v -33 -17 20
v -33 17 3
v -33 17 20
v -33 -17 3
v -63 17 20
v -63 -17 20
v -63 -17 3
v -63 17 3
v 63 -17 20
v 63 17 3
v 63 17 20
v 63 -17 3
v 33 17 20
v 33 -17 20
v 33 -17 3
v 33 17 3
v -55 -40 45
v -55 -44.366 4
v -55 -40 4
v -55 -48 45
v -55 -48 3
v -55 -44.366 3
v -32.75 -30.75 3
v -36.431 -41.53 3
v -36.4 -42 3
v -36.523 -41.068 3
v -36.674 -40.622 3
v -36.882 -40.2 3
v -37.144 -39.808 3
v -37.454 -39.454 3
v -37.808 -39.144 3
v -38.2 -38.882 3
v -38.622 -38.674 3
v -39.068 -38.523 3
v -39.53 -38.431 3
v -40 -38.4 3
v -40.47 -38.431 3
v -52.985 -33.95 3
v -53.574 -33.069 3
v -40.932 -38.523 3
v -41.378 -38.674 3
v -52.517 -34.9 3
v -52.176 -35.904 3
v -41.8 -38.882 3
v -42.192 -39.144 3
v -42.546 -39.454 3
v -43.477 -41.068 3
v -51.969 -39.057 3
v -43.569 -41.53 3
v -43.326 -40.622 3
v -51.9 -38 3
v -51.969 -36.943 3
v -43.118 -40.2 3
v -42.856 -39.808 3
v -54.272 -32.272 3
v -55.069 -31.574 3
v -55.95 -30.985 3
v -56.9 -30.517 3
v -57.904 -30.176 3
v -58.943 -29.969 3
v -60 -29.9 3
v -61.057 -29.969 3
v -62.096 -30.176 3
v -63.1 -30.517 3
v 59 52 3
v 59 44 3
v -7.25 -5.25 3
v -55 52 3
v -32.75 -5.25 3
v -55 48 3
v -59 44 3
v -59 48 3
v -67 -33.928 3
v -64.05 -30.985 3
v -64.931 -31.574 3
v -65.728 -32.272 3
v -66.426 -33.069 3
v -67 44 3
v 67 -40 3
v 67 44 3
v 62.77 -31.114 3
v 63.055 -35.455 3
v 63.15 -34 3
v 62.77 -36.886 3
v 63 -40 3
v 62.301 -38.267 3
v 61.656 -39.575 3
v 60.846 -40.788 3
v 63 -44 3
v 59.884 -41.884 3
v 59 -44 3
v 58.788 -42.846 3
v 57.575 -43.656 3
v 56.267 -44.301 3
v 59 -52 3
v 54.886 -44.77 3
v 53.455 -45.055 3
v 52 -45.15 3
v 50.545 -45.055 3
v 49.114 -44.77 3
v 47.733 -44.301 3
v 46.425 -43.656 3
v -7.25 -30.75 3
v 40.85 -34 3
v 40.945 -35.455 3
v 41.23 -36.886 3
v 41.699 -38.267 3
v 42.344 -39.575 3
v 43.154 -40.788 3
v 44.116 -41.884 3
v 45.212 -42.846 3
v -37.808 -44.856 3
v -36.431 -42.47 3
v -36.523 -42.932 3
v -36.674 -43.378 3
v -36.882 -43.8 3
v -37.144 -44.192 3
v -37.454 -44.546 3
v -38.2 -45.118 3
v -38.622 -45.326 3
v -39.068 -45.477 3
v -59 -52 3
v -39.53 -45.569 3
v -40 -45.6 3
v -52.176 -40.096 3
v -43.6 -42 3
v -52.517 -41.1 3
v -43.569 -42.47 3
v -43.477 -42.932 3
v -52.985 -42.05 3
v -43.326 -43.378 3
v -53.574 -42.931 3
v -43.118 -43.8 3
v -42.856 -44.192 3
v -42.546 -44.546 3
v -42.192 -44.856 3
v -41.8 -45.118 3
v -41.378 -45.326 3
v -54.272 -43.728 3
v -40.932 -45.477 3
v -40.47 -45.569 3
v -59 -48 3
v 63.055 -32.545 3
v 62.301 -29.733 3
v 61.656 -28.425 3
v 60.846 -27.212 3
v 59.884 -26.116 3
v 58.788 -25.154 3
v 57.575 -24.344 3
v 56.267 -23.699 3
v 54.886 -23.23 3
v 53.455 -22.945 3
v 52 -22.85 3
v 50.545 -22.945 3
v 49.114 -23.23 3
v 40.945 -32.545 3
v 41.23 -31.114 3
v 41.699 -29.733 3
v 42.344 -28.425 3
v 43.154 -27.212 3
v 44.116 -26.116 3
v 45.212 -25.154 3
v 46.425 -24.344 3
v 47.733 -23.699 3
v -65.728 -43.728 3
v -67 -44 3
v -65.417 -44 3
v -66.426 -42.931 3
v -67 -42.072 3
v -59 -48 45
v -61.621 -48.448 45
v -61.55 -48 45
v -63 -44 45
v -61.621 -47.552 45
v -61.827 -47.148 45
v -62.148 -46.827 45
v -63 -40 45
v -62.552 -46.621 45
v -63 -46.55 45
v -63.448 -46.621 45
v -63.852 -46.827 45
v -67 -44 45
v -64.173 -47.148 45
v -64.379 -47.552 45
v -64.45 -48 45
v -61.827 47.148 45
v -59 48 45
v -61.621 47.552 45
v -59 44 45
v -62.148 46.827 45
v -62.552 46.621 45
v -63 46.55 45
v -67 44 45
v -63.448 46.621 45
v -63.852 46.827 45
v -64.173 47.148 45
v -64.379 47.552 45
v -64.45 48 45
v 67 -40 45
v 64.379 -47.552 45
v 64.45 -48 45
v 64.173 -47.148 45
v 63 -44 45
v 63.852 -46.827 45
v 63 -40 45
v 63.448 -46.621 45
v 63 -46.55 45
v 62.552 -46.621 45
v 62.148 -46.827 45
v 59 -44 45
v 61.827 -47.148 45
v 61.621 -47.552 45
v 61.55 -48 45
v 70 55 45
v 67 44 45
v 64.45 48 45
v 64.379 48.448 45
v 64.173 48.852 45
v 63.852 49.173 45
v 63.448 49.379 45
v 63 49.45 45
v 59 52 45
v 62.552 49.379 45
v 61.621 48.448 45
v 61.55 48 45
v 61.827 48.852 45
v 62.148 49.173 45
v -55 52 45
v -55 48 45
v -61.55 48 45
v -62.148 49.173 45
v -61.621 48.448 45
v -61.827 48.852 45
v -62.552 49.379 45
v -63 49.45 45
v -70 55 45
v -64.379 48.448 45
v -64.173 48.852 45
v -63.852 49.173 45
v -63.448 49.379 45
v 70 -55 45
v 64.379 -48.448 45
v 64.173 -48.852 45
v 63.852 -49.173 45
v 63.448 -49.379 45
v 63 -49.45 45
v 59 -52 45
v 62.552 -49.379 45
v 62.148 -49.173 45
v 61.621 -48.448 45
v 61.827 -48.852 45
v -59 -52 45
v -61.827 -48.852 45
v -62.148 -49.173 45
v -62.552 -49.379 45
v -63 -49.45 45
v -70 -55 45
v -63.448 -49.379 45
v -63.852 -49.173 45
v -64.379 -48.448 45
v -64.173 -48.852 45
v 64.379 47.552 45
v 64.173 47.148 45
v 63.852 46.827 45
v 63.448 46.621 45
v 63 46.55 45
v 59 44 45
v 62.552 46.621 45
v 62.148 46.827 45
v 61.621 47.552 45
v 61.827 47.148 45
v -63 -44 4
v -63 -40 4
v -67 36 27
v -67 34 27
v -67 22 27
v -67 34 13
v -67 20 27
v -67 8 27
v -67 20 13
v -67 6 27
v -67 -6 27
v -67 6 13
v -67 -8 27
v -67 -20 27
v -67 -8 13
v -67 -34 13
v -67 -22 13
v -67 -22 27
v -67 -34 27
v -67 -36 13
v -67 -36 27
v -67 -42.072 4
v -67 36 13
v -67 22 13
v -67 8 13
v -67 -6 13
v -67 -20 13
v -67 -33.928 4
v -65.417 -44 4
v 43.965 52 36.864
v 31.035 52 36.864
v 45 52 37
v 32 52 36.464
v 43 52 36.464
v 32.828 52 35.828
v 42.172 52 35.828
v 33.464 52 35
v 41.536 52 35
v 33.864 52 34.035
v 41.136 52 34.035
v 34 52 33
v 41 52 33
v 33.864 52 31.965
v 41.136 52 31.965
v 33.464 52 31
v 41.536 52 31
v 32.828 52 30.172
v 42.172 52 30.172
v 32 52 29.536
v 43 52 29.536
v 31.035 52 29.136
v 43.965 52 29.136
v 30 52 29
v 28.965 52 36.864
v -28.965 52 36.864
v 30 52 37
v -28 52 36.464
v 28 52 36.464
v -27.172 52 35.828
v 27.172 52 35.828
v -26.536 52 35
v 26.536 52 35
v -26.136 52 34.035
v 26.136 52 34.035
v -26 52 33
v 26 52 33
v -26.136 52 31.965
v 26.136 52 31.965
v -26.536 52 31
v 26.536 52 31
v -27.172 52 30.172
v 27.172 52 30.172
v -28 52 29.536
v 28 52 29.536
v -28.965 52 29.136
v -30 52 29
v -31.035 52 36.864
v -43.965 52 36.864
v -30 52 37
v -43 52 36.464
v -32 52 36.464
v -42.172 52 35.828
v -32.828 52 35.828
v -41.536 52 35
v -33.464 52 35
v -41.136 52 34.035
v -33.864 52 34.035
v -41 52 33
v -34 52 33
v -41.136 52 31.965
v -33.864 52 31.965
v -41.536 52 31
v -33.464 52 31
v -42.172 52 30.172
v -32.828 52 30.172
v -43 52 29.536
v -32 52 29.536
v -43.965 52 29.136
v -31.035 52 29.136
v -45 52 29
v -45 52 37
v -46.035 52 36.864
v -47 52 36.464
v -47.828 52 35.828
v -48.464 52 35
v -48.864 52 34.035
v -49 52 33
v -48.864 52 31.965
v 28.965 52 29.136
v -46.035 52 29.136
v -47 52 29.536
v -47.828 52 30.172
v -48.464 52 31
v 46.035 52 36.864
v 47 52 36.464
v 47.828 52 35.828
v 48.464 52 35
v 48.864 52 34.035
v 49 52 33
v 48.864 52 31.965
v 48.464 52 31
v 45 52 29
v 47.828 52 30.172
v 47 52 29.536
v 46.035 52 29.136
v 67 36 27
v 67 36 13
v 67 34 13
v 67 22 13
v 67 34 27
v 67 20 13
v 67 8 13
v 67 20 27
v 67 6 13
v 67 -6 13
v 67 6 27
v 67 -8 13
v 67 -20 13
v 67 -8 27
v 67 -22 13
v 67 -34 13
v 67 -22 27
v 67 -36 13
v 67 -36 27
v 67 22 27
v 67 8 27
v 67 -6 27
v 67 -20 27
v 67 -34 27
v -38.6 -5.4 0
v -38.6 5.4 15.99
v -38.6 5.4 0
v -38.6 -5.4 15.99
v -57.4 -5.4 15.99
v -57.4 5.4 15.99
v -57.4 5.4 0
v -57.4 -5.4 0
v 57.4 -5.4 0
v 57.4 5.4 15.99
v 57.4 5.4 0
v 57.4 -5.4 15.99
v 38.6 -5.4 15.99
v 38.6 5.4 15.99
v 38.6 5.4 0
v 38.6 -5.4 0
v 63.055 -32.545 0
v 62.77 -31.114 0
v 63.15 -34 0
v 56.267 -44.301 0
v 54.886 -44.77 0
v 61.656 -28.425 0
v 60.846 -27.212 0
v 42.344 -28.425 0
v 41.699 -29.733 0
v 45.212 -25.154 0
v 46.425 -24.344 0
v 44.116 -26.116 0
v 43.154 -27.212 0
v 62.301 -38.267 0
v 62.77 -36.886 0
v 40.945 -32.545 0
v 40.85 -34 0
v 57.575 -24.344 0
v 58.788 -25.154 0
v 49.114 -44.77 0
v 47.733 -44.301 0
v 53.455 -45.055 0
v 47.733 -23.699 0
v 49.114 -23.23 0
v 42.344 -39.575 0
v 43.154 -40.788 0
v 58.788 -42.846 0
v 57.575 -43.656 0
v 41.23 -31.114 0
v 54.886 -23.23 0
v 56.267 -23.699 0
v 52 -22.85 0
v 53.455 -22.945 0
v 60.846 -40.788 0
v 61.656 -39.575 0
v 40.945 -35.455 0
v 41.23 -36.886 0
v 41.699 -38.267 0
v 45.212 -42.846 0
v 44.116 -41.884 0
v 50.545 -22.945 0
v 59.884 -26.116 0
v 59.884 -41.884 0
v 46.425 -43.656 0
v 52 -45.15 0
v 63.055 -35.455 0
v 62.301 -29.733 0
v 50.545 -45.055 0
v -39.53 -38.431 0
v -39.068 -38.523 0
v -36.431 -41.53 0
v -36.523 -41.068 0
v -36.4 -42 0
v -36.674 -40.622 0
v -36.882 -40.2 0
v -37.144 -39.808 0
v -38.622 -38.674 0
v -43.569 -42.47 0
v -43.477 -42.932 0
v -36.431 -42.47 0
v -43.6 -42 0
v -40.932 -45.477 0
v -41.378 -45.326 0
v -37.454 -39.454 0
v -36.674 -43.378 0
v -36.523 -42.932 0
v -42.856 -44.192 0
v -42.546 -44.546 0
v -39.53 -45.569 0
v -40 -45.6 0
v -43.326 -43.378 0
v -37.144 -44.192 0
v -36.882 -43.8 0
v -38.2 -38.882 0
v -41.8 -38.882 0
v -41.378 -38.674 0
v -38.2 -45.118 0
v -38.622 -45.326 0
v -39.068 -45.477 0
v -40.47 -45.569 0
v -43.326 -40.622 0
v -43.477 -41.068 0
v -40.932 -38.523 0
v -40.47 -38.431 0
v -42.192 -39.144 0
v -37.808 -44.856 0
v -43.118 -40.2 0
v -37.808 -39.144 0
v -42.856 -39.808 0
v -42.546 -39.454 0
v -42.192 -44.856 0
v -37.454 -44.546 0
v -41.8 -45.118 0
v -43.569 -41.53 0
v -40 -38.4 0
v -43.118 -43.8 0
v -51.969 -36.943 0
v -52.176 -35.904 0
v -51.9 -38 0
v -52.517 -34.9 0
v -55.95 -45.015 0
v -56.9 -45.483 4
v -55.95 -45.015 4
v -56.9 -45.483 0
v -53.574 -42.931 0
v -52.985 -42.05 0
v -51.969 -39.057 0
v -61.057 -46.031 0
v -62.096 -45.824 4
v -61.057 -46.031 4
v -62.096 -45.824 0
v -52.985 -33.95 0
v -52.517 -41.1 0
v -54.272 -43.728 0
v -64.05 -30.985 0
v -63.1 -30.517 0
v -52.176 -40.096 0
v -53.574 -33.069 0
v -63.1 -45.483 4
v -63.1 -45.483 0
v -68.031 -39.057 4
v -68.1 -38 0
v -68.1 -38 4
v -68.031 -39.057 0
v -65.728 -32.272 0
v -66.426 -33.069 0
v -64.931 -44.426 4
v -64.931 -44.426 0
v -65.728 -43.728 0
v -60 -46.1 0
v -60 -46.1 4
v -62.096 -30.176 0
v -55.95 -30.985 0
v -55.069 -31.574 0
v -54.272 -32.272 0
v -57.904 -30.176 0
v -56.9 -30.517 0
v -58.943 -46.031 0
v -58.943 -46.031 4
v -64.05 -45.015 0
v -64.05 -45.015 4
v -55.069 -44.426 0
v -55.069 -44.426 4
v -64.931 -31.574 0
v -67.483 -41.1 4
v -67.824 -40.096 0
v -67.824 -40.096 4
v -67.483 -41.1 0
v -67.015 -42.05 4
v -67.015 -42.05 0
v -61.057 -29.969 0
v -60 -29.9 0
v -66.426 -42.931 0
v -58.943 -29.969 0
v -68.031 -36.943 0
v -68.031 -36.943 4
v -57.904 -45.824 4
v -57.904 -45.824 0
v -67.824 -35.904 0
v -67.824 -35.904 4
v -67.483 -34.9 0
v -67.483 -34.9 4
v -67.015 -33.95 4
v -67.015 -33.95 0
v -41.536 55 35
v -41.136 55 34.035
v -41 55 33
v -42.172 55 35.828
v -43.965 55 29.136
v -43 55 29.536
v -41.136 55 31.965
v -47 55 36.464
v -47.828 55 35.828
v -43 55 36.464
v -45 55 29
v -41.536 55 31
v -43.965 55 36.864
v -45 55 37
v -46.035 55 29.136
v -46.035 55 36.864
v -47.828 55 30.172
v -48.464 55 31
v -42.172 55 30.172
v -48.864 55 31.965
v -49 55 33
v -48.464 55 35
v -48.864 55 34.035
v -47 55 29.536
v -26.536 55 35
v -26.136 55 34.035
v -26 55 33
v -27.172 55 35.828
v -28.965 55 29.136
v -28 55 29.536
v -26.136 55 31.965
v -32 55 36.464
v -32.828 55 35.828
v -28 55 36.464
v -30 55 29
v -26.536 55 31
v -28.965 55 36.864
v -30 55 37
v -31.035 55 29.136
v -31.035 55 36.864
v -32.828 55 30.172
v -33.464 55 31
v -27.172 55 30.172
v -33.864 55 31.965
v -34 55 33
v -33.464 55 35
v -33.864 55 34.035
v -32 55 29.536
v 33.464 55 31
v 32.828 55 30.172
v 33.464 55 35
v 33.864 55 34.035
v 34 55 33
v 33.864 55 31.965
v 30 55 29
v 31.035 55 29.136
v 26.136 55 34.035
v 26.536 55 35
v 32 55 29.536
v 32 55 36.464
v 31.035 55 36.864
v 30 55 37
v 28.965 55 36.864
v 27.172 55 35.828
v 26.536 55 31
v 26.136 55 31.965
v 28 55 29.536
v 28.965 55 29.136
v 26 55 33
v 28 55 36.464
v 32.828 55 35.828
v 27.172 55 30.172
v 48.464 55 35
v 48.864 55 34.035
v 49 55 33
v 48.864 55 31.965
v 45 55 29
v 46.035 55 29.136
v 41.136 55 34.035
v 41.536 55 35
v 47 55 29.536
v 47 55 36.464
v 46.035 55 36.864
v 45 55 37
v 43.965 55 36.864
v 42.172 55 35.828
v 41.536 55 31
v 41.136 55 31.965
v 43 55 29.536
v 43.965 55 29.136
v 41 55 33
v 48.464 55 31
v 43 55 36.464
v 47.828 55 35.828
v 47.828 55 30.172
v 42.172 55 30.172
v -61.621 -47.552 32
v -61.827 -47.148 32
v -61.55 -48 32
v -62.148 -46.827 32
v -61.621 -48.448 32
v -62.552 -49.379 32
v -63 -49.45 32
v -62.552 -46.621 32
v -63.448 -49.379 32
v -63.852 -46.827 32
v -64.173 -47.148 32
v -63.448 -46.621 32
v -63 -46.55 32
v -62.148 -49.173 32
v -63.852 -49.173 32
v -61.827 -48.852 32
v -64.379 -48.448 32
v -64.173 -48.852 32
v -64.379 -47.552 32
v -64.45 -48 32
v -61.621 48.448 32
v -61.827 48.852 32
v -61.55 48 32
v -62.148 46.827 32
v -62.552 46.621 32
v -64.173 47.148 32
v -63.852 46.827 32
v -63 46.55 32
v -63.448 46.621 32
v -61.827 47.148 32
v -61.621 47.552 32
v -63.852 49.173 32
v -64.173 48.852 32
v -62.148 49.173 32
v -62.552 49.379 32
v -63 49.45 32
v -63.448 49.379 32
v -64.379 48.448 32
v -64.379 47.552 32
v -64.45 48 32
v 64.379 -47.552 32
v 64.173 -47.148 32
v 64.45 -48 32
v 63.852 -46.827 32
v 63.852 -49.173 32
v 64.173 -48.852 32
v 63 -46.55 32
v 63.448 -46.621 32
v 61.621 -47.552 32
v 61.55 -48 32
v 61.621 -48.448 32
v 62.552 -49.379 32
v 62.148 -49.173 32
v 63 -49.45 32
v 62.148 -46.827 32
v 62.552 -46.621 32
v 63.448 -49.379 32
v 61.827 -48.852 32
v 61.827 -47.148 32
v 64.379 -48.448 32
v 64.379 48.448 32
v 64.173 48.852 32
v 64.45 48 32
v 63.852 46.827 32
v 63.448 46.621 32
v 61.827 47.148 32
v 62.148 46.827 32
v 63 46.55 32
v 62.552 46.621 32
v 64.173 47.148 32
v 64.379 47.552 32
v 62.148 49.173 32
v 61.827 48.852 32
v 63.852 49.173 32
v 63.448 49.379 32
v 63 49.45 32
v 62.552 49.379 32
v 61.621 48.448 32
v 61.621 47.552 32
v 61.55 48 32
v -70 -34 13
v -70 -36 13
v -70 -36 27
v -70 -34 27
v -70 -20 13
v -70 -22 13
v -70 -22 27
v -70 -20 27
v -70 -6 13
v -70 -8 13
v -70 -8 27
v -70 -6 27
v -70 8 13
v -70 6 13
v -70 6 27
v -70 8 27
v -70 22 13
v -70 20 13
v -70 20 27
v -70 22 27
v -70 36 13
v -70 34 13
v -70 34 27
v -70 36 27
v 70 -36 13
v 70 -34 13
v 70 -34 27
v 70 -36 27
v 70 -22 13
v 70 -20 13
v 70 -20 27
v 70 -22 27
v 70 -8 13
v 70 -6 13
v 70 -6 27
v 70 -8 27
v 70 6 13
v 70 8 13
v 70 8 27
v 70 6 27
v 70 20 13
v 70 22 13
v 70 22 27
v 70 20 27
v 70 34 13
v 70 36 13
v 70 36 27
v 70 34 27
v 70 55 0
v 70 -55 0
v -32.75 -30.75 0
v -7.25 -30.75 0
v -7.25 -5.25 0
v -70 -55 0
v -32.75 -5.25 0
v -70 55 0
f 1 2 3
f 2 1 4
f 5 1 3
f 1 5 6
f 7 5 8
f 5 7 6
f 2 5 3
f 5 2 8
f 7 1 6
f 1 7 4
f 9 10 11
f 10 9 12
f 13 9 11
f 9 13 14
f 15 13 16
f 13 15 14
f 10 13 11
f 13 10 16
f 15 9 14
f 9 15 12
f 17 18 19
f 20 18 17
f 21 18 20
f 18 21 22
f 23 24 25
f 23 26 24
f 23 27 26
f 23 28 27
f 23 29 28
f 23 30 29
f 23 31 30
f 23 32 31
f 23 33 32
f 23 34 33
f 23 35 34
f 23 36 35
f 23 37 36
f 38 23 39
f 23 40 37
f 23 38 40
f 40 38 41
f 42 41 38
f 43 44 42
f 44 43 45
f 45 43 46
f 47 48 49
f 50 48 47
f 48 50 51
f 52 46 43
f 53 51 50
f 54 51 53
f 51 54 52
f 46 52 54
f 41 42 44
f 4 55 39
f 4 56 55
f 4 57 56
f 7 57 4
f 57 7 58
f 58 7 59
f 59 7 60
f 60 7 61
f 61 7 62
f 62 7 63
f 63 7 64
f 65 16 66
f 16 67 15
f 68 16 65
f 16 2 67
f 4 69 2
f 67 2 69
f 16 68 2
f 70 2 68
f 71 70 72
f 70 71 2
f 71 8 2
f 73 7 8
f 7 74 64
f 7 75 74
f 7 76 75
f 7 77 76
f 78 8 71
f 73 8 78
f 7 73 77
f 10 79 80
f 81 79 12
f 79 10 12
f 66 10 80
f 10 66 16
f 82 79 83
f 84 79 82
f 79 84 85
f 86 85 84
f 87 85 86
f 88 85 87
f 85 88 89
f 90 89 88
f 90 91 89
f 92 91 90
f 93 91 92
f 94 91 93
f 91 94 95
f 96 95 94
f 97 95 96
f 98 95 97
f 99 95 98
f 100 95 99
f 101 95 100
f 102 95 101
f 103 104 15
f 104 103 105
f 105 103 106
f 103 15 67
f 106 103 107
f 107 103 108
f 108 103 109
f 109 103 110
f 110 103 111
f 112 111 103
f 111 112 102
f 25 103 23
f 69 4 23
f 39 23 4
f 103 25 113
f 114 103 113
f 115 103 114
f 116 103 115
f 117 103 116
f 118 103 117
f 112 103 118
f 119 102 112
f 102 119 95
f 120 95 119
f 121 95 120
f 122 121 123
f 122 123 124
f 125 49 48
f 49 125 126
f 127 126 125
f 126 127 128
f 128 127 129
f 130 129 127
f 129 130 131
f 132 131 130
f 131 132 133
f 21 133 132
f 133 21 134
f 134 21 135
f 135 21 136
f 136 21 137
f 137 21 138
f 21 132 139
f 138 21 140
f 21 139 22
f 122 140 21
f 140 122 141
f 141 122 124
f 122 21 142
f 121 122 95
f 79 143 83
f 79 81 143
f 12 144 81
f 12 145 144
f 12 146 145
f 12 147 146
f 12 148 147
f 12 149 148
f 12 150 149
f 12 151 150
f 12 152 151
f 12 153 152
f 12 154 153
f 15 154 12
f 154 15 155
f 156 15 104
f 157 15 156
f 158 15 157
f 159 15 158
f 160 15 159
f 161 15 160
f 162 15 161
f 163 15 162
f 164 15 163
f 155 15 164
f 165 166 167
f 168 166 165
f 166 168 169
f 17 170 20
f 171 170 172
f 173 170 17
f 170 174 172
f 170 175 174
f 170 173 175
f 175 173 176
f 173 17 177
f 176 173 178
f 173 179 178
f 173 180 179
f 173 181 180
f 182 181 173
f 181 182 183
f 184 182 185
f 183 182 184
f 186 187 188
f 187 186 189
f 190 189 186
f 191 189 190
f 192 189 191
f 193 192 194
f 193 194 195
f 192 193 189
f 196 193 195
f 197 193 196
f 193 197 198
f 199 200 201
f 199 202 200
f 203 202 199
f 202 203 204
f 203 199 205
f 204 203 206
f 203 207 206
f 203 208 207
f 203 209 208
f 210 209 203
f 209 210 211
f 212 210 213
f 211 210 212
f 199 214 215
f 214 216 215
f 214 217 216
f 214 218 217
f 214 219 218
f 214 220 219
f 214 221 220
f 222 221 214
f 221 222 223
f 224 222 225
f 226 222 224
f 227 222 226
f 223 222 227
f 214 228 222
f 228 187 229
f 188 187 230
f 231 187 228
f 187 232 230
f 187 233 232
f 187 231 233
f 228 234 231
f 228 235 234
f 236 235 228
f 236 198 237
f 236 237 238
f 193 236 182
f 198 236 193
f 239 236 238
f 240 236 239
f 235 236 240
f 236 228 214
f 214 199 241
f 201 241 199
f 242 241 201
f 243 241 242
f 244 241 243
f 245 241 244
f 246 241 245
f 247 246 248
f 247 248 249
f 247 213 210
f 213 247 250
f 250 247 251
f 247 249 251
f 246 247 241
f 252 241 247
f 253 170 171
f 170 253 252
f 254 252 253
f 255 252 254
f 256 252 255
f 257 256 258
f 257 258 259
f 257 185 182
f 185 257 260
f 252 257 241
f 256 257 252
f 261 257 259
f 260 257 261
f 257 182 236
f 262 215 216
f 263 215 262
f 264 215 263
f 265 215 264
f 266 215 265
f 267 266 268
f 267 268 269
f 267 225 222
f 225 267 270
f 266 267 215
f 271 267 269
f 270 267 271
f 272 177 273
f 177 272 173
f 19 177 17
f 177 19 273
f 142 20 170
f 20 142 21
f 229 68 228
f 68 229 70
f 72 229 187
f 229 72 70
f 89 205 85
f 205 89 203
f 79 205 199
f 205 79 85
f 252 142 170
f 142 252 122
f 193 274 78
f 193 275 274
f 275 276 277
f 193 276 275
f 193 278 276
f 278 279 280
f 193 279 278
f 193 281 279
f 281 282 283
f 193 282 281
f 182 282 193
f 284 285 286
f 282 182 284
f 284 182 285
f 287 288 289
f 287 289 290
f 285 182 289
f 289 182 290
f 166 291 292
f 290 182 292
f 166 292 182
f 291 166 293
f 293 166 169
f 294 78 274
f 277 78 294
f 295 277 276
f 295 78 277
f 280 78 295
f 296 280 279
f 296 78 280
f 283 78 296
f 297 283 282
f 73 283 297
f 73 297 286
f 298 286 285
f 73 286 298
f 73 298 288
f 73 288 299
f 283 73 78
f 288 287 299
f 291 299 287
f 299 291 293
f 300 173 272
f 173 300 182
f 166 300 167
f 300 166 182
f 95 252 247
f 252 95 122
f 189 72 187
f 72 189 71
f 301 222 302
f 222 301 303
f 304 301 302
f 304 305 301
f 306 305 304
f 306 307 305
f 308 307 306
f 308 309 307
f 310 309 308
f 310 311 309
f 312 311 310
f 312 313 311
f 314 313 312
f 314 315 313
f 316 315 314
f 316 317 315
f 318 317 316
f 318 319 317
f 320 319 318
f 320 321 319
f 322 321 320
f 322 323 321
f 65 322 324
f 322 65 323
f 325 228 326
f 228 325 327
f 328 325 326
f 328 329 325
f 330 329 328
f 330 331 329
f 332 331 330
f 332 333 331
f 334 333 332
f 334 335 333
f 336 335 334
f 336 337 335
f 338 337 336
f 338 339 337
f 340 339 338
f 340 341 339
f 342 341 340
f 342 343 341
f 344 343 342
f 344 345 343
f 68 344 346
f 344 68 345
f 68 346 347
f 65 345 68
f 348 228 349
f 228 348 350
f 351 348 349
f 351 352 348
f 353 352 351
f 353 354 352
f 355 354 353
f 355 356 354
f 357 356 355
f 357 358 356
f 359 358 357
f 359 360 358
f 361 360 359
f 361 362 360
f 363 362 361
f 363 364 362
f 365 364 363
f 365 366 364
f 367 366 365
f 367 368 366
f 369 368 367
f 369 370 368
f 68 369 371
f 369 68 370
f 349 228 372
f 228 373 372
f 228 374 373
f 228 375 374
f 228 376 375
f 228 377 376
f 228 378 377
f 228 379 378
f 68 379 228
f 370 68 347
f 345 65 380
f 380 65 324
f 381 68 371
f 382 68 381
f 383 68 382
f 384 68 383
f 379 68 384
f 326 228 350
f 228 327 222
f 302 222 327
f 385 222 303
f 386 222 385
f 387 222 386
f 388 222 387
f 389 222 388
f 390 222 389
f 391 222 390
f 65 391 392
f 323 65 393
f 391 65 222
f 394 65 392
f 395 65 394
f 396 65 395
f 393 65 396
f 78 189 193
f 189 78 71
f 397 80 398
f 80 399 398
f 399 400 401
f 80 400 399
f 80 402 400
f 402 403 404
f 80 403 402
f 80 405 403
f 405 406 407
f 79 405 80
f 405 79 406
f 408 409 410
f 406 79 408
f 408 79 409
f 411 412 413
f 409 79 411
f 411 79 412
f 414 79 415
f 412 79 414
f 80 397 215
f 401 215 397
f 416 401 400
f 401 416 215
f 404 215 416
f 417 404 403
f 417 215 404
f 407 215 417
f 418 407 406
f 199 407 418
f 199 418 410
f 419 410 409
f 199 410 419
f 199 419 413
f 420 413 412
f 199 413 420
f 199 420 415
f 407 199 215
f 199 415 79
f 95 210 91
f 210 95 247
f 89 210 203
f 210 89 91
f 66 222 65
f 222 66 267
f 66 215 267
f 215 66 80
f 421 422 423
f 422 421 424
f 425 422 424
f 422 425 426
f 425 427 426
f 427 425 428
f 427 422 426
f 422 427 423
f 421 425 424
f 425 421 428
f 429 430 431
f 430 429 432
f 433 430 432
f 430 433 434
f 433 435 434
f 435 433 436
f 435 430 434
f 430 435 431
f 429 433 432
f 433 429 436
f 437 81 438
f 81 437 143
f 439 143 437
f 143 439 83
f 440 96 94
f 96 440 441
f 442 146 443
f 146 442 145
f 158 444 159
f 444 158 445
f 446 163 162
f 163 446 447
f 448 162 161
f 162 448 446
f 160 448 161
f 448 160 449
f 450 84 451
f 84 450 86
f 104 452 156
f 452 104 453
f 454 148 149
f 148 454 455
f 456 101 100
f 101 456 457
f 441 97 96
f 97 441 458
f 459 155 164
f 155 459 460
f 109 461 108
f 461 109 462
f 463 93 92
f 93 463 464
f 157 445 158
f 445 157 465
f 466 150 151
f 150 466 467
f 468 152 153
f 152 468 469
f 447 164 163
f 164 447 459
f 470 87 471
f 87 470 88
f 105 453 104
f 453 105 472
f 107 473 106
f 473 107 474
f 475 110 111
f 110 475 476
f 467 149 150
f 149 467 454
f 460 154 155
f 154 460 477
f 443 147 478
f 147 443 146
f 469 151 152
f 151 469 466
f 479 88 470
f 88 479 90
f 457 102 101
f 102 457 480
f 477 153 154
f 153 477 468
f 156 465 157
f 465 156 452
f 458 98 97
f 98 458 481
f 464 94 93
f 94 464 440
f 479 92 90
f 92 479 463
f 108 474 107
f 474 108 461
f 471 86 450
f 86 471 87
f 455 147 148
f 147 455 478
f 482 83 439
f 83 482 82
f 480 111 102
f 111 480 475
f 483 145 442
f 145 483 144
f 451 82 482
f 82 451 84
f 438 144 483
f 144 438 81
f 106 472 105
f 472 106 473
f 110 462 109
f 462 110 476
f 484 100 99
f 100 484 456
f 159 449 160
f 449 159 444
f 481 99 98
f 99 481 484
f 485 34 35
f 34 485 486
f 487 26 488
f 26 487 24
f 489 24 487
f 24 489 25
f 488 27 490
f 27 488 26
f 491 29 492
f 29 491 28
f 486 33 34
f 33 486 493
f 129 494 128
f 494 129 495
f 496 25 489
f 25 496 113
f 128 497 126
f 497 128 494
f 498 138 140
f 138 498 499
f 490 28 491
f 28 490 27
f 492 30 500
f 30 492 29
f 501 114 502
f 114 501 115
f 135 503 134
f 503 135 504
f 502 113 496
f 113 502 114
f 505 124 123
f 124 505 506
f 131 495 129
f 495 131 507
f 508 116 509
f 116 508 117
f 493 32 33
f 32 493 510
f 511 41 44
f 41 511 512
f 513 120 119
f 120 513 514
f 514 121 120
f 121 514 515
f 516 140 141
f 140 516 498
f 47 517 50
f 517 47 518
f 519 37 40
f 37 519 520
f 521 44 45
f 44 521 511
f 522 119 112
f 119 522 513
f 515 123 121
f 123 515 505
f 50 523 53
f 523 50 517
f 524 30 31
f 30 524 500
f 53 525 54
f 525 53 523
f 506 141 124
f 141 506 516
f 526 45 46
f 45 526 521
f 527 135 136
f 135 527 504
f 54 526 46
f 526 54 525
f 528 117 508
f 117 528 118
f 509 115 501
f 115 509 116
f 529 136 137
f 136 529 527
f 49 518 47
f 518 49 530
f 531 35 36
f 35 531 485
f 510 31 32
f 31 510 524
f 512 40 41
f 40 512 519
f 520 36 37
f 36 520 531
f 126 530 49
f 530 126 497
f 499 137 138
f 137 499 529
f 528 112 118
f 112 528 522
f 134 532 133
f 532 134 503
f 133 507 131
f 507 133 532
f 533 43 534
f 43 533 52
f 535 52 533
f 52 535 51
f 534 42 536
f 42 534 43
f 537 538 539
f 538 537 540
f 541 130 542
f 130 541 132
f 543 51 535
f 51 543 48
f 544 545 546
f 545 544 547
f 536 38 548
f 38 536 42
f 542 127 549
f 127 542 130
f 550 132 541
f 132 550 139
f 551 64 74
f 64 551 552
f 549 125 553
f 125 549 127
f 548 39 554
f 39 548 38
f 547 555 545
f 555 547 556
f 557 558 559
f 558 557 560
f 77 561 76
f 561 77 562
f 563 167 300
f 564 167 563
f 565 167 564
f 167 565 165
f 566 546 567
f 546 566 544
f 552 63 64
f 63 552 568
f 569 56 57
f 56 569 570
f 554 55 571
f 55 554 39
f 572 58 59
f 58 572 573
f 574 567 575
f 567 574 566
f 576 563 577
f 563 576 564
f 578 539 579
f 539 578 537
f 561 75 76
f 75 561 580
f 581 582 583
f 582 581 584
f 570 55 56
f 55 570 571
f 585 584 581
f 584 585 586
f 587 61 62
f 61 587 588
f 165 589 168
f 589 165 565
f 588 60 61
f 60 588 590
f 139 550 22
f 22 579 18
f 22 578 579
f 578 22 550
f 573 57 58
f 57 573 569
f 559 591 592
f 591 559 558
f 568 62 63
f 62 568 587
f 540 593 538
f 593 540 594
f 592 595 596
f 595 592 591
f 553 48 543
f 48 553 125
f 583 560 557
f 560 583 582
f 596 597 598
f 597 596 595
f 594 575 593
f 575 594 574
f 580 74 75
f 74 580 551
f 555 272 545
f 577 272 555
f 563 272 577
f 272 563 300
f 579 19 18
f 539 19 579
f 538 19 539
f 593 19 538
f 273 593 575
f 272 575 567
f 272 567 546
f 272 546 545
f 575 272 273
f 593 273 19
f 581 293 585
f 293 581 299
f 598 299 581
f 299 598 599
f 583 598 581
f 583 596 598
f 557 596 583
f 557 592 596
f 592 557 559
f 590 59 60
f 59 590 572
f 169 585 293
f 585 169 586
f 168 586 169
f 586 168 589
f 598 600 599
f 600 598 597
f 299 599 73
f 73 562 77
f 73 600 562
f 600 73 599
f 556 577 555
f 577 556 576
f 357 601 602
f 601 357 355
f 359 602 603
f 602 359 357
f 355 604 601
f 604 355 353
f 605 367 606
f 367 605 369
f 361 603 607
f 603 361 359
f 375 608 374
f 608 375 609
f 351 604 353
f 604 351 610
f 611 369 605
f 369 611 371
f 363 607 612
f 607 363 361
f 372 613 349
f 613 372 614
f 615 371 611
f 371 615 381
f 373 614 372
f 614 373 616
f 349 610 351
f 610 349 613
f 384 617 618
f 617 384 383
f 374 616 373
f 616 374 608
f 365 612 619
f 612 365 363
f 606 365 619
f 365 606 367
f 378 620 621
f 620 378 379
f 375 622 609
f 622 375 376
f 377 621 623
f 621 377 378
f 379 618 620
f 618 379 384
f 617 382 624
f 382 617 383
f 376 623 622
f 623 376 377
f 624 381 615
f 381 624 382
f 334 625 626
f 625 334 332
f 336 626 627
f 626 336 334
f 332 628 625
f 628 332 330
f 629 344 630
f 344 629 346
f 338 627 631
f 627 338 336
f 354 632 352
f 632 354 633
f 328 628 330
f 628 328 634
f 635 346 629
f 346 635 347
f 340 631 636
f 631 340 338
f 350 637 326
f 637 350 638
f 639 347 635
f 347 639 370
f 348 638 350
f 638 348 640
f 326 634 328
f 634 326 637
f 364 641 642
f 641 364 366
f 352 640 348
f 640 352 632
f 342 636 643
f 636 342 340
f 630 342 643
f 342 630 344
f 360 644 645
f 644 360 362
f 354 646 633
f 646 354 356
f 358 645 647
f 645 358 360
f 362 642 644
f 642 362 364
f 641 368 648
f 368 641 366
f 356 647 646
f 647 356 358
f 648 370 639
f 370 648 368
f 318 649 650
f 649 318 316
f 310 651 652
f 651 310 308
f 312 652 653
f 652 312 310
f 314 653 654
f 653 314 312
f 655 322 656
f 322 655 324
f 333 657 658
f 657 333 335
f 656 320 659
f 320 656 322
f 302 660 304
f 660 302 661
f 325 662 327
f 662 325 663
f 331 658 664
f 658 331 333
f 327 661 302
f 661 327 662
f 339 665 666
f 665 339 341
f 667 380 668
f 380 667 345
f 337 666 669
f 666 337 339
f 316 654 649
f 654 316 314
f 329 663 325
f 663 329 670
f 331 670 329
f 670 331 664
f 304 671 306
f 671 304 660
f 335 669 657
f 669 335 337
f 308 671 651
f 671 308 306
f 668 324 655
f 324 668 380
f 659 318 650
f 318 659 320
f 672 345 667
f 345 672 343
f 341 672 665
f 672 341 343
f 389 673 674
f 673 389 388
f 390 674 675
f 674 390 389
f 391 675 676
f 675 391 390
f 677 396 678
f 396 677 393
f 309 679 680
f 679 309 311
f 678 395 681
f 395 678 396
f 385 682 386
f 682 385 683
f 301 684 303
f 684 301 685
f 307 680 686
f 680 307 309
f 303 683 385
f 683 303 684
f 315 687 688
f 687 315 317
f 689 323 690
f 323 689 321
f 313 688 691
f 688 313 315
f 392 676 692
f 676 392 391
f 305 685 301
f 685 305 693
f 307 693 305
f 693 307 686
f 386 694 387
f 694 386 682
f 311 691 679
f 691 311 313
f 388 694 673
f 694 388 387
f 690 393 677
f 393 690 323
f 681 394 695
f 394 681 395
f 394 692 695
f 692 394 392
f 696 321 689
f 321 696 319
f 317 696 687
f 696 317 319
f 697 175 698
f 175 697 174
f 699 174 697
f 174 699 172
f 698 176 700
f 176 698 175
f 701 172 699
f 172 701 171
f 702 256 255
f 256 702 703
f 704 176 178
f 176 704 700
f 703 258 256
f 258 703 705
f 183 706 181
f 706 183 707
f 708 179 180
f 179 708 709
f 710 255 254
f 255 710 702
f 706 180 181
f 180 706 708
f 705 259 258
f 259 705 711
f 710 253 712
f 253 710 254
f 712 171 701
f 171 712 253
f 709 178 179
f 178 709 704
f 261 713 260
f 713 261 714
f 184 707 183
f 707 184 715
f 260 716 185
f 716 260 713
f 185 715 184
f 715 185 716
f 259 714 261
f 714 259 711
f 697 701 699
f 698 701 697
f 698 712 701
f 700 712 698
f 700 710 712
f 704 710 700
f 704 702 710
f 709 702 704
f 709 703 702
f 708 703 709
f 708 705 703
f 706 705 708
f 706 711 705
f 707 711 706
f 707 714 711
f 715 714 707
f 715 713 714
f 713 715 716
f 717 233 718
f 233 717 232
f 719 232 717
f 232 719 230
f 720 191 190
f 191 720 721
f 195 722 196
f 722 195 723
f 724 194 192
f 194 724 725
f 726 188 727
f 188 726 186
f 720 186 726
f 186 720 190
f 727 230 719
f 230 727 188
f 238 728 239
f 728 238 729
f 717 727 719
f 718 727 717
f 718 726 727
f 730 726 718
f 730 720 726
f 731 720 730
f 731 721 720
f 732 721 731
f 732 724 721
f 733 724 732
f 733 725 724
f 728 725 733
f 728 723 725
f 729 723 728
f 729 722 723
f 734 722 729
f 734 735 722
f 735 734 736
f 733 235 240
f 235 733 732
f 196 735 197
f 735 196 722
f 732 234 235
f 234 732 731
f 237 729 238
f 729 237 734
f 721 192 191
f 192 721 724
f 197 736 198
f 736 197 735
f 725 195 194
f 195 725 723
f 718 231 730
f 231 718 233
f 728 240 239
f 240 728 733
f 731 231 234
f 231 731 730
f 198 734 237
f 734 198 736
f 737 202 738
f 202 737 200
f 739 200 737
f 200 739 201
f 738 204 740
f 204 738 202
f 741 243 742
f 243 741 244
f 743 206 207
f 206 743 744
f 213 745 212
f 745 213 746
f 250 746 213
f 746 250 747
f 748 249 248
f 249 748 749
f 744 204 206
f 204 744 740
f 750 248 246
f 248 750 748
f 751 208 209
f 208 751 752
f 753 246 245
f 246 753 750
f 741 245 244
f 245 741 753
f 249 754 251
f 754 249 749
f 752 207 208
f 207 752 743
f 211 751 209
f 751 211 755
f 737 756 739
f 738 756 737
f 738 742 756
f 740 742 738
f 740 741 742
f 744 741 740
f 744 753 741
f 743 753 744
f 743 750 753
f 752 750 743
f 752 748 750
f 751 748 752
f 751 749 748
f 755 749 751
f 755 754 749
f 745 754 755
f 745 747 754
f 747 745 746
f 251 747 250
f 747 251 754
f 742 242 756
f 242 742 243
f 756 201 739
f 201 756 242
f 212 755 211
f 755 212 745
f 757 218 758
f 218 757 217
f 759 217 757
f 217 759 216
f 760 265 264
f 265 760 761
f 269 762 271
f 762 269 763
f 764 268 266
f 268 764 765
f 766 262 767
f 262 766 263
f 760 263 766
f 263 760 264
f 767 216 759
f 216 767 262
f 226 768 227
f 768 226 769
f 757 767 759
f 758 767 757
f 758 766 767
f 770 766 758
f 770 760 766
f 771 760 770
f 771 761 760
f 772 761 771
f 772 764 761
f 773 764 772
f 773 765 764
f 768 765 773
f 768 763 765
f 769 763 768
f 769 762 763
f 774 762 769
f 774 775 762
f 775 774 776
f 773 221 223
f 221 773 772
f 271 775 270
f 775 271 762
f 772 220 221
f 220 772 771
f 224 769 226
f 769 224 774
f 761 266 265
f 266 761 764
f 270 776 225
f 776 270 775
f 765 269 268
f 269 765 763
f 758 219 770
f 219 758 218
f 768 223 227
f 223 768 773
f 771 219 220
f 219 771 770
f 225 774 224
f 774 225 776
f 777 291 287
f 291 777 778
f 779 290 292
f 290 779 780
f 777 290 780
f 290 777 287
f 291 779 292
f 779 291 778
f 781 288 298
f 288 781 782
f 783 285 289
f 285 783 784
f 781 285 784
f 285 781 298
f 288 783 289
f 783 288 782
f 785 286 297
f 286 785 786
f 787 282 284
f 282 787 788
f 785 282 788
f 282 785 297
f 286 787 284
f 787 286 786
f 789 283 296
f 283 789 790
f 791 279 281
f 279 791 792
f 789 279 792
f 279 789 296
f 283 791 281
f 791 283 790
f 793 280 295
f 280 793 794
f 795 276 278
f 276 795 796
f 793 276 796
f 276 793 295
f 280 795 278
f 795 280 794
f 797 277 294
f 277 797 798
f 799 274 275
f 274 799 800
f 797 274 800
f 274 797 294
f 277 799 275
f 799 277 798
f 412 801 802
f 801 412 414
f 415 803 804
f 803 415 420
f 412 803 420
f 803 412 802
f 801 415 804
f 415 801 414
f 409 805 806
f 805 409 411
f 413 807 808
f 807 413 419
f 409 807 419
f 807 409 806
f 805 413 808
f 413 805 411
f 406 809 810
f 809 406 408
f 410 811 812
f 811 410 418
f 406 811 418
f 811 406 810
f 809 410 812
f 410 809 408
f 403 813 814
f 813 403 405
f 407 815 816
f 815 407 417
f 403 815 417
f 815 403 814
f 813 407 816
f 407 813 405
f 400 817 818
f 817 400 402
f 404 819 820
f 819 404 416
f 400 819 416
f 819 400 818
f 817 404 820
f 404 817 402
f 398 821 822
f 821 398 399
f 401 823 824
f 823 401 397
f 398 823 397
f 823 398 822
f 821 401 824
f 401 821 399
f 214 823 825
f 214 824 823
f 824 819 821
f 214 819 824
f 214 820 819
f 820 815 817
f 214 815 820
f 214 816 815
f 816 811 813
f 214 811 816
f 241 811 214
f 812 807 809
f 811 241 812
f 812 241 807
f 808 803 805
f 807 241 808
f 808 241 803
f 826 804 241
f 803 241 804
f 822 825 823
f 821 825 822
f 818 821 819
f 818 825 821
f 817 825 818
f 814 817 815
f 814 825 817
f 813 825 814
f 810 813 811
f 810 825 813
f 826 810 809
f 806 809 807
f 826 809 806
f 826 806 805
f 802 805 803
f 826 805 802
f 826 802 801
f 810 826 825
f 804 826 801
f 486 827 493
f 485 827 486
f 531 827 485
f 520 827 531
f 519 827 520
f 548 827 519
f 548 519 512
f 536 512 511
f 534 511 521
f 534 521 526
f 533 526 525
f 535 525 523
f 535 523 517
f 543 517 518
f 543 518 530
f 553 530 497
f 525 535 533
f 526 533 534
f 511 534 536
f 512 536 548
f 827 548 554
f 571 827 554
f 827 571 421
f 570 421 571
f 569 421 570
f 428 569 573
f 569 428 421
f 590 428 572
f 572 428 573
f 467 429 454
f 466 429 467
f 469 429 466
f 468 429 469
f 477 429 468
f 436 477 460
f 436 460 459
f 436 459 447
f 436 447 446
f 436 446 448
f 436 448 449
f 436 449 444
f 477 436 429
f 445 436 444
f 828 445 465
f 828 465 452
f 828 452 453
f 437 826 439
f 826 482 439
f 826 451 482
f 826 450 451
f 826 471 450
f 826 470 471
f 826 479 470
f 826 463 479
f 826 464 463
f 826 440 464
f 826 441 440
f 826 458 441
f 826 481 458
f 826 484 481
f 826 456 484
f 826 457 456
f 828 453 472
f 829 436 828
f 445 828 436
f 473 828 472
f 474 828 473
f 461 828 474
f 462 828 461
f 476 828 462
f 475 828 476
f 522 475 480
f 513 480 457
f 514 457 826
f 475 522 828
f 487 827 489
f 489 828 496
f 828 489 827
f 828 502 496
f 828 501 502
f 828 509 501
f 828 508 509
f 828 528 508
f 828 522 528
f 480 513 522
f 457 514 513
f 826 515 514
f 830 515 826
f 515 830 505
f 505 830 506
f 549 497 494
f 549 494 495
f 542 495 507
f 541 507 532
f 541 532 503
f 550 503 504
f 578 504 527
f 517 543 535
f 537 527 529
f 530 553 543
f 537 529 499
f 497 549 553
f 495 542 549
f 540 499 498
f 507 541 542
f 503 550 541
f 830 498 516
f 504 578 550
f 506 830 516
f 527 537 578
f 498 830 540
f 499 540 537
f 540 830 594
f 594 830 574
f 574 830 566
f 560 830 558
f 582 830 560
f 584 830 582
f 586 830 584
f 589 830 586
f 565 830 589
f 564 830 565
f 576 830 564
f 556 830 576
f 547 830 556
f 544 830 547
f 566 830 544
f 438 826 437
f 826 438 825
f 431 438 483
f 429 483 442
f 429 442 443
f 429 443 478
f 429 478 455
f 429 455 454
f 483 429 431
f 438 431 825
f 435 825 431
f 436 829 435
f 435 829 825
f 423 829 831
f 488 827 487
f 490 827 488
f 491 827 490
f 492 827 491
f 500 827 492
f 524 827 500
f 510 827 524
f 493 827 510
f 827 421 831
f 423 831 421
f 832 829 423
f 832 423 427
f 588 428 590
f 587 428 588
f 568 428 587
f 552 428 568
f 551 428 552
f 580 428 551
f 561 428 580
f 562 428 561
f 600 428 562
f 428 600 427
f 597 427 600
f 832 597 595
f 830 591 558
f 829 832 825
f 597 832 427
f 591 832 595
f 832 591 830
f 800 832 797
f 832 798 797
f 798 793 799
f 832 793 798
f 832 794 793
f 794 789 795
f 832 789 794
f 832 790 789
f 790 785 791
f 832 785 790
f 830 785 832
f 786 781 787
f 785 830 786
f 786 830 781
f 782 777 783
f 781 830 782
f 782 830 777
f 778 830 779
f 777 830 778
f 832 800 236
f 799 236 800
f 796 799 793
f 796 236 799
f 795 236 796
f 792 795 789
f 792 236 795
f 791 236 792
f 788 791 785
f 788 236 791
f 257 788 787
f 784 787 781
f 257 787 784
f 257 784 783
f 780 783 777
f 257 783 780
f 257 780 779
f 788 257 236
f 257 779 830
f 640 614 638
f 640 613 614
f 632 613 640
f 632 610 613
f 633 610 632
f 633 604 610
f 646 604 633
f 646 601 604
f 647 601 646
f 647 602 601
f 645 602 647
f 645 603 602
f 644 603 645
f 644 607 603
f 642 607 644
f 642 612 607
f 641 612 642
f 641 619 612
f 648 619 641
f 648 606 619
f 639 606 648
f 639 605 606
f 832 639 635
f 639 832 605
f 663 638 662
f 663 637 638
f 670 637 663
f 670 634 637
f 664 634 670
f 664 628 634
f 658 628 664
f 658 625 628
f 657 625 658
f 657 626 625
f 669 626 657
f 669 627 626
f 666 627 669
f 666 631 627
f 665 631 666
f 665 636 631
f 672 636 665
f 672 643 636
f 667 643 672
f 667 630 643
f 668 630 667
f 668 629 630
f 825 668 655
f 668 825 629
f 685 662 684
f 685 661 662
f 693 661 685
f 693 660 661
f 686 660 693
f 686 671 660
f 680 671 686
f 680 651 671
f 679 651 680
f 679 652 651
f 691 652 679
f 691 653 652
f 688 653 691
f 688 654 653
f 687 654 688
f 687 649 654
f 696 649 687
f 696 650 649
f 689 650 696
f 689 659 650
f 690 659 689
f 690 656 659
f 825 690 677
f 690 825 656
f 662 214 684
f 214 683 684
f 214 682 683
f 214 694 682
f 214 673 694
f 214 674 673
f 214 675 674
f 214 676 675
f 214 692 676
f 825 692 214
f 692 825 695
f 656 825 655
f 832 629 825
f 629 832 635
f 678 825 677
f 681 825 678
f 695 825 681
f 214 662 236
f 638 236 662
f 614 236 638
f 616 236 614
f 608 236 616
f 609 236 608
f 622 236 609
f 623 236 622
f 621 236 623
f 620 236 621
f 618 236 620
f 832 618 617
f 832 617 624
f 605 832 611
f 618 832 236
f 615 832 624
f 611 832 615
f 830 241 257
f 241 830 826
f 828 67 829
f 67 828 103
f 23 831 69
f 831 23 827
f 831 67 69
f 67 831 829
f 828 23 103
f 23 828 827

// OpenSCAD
// ferris/base_box.scad (v7.1 embedded variant, 2026-09-10)
// Motor-side base pad as a hollow box: tower foot slots on top (same +/-48
// layout as base_mini), the 80x60 control PCB + AtomS3R inside, AtomS3R
// window on top, E-stop / pot / RUN-STOP on the TOP face (front strip, -y),
// cable exits on the rear wall (+y toward the wheel), removable bottom lid.
//   PART="box" : printed upside down? No - printed upright (open bottom on the
//                bed would trap supports); the box is printed with the OPEN
//                BOTTOM UP (top face on the bed): flat top, no bridges.
//   PART="lid" : bottom lid, 4 x M3 self-tap into the corner bosses,
//                PCB standoffs (Ø2.9 pilots) on its inner face.
// Coordinates: box centre at origin, z up (top face at z = bb_z), tower feet
// along x, shaft axis along y (wheel side = +y).

include <../params.scad>;

PART = "box";

in_x = bb_x - 2*bb_wall;  in_y = bb_y - 2*bb_wall;  in_z = bb_z - bb_wall;   // cavity below the top plate
lid_in = bb_lid_t;
pcb_cx = 0;  pcb_cy = bb_pcb_oy;
atom_cx = pcb_cx + (pcb_atom_cx - pcb_x/2);   // -20
atom_cy = pcb_cy - (pcb_atom_cy - pcb_y/2);   // PCB's +y (connector edge) faces the wheel (+y); atom at board y=30 -> centre
boss = 8;

module foot_slots() {
    for (sx = [-1, 1])
        translate([sx * 48 - base_slot_w/2, -base_slot_t/2, bb_z - base_slot_d + 0.01])
            cube([base_slot_w, base_slot_t, base_slot_d + 1]);
}

module box_body() {
    difference() {
        union() {
            translate([-bb_x/2, -bb_y/2, 0]) cube([bb_x, bb_y, bb_z]);
        }
        // cavity, open at the bottom
        difference() {
            translate([-in_x/2, -in_y/2, -1]) cube([in_x, in_y, in_z + 1]);
            // keep solid blocks under the foot slots (30 x 34 like base_mini) so the tabs bite into material
            for (sx = [-1, 1]) translate([sx * 48 - 15, -17, bb_z - base_slot_d - bb_foot_pad]) cube([30, 34, base_slot_d + bb_foot_pad + 1]);
            // corner bosses for the lid screws
            for (sx = [-1, 1], sy = [-1, 1]) translate([sx * (in_x/2 - boss/2), sy * (in_y/2 - boss/2), 0]) cube([boss, boss, in_z], center = false);
            for (sx = [-1, 1], sy = [-1, 1]) translate([sx * (in_x/2 - boss/2) - boss/2, sy * (in_y/2 - boss/2) - boss/2, -1]) cube([boss, boss, in_z + 1]);
        }
        foot_slots();
        // AtomS3R window on top
        translate([atom_cx - bb_atom_win/2, atom_cy - bb_atom_win/2, bb_z - bb_wall - 1]) cube([bb_atom_win, bb_atom_win, bb_wall + 2]);
        // panel parts on the top face (front strip)
        for (h = [[bb_estop_pos, panel_estop_hole_d], [bb_pot_pos, panel_pot_hole_d], [bb_btn_pos, panel_btn_hole_d]])
            translate([h[0][0], h[0][1], bb_z - bb_wall - 1]) cylinder(d = h[1], h = bb_wall + 2, $fn = 48);
        // rear wall cable exits (+y): motor, LED x2, 12V
        for (x = [-45, -30, 30, 45])
            translate([x, bb_y/2 - bb_wall - 1, 12]) rotate([-90, 0, 0]) cylinder(d = bb_cable_hole_d, h = bb_wall + 2, $fn = 24);
        // lid screw pilots in the corner bosses
        for (sx = [-1, 1], sy = [-1, 1]) translate([sx * (in_x/2 - boss/2), sy * (in_y/2 - boss/2), -1]) cylinder(d = m3_thread, h = 14, $fn = 20);
        // vent slots on the side walls
        for (sx = [-1, 1], k = [0 : 5])
            translate([sx * (bb_x/2 - bb_wall/2), -35 + k * 14, 25]) cube([bb_wall + 2, 2, 14], center = true);
    }
}

module box() { translate([0, 0, bb_z]) mirror([0, 0, 1]) box_body(); }   // top face on the bed

// plain riser for the other tower (same height, foot slots only, hollow to save filament)
module box_plain_body() {
    difference() {
        translate([-bb_x/2, -bb_y/2, 0]) cube([bb_x, bb_y, bb_z]);
        difference() {
            translate([-in_x/2, -in_y/2, -1]) cube([in_x, in_y, in_z + 1]);
            for (sx = [-1, 1]) translate([sx * 48 - 15, -17, bb_z - base_slot_d - bb_foot_pad]) cube([30, 34, base_slot_d + bb_foot_pad + 1]);
            // cross ribs for stiffness
            translate([-in_x/2, -3, -1]) cube([in_x, 6, in_z + 1]);
            translate([-3, -in_y/2, -1]) cube([6, in_y, in_z + 1]);
        }
        foot_slots();
    }
}
module box_plain() { translate([0, 0, bb_z]) mirror([0, 0, 1]) box_plain_body(); }

module lid() {
    difference() {
        union() {
            translate([-in_x/2 + 0.3, -in_y/2 + 0.3, 0]) cube([in_x - 0.6, in_y - 0.6, lid_in]);
            // PCB standoffs
            translate([0, 0, lid_in - 0.01]) for (sx = [-1, 1], sy = [-1, 1])
                translate([pcb_cx + sx * (pcb_x/2 - pcb_hole_inset), pcb_cy + sy * (pcb_y/2 - pcb_hole_inset), 0]) cylinder(d = 7, h = bb_pcb_standoff, $fn = 32);
        }
        for (sx = [-1, 1], sy = [-1, 1]) translate([pcb_cx + sx * (pcb_x/2 - pcb_hole_inset), pcb_cy + sy * (pcb_y/2 - pcb_hole_inset), 1]) cylinder(d = m3_thread, h = 20, $fn = 20);
        // corner clearance for the bosses + screw holes
        for (sx = [-1, 1], sy = [-1, 1]) translate([sx * (in_x/2 - boss/2), sy * (in_y/2 - boss/2), -1]) cylinder(d = m3_clear, h = lid_in + 2, $fn = 24);
    }
}

if (PART == "box") box();
else if (PART == "box-plain") box_plain();
else if (PART == "lid") lid();
